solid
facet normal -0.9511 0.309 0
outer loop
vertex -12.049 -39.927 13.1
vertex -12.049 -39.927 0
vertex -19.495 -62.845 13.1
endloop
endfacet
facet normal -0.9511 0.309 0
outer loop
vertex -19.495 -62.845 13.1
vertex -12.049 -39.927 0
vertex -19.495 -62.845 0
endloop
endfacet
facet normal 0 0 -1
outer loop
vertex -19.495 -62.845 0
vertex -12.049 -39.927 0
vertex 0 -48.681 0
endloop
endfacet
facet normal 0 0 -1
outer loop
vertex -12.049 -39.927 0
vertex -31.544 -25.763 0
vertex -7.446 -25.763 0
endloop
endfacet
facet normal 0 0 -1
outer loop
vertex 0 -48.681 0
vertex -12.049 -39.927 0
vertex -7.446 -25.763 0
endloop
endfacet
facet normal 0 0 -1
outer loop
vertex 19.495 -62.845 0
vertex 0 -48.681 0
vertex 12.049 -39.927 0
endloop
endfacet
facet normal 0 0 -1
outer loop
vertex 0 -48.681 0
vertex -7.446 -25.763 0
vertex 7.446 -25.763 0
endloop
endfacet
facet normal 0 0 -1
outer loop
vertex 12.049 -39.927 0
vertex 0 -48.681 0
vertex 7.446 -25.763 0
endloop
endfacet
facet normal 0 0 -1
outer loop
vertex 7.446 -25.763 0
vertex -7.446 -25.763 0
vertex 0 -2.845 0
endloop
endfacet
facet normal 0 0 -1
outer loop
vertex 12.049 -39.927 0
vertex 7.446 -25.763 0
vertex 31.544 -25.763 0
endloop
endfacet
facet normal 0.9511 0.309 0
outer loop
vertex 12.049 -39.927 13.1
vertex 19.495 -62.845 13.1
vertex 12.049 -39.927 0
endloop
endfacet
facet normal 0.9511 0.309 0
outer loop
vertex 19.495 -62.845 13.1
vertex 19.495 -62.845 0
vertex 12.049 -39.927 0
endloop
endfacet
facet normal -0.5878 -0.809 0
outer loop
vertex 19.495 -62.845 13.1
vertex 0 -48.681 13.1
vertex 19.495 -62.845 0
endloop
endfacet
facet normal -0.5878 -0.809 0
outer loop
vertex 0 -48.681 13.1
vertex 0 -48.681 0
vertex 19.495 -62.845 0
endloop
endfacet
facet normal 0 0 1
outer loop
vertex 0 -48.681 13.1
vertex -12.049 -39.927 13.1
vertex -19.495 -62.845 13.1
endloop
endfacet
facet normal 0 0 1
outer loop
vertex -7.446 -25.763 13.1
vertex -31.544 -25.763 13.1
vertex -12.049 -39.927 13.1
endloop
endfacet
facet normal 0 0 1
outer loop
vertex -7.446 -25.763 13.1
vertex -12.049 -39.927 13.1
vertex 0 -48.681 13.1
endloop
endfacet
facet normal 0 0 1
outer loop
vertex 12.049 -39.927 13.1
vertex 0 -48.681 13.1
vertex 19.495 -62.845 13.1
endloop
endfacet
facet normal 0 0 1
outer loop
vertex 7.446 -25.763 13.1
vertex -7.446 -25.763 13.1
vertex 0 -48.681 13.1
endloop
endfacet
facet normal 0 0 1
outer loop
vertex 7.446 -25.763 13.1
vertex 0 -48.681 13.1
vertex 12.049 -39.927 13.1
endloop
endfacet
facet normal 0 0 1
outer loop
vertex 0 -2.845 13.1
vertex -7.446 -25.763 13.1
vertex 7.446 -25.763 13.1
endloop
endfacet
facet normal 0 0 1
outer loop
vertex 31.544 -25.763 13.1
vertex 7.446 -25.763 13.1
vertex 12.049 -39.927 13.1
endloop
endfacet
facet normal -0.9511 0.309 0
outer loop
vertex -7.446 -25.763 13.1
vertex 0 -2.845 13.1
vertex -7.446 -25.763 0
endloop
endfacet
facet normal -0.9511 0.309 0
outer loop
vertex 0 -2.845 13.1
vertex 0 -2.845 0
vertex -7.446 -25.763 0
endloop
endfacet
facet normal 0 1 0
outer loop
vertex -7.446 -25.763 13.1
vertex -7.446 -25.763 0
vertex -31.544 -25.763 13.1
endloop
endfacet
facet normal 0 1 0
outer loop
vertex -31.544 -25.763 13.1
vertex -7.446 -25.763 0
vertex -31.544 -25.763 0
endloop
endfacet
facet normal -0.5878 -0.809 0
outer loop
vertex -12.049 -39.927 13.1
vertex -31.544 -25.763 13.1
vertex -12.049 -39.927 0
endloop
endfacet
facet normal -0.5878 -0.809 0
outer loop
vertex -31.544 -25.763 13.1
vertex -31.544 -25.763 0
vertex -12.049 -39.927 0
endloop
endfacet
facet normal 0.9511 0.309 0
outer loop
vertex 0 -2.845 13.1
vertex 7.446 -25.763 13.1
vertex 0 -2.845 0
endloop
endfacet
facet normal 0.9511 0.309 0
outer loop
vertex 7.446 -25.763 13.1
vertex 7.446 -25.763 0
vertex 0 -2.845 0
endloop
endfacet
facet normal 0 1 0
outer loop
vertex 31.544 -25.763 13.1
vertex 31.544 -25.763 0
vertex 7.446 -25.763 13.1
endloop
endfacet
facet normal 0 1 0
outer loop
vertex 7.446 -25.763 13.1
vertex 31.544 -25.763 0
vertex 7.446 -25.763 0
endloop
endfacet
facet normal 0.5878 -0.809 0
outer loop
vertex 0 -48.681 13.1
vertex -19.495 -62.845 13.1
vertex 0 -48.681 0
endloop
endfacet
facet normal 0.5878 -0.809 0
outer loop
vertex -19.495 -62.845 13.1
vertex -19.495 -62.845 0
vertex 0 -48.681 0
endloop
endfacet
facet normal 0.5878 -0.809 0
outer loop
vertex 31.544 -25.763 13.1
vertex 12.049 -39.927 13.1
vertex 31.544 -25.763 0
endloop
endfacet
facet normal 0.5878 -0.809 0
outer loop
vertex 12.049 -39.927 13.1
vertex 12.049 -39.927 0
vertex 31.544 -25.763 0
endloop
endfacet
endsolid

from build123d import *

# Parameters (mm, degrees)
F1_DEPTH = 0.4
F5_DEPTH = 12.7
F6_DEPTH = 12.7


with BuildPart() as f1:
    # F0 (on Top) → F1 (new body)
    with BuildSketch(Plane.XY):
        Polygon((-31.5438667271, -25.7632551613), (-12.0486849532, -39.9273338113), (-19.495181774, -62.8452944863), (0, -48.6812158363), (19.495181774, -62.8452944863), (12.0486849532, -39.9273338113), (31.5438667271, -25.7632551613), (7.4464968208, -25.7632551613), (0, -2.8452944863), (-7.4464968208, -25.7632551613), align=None)
    extrude(amount=F1_DEPTH)

    # F2 (on face) → F5 (join)
    with BuildSketch(Plane.XY.offset(0.4)):
        Polygon((9.747590887, -32.8452944863), (7.4464968208, -25.7632551613), (0, -2.8452944863), (-7.4464968208, -25.7632551613), (-31.5438667271, -25.7632551613), (-12.0486849532, -39.9273338113), (-19.495181774, -62.8452944863), (0, -48.6812158363), (19.495181774, -62.8452944863), (12.0486849532, -39.9273338113), align=None)
        Polygon((31.5438667271, -25.7632551613), (9.747590887, -32.8452944863), (12.0486849532, -39.9273338113), align=None)
    extrude(amount=F5_DEPTH)

    # F6 (add): a face of the model
    f6_faces = [f1.faces().sort_by_distance(p)[0] for p in [
        (16.2459848116, -28.1239349363, 0.4),
    ]]
    extrude(f6_faces, amount=F6_DEPTH)


solid = f1.part
